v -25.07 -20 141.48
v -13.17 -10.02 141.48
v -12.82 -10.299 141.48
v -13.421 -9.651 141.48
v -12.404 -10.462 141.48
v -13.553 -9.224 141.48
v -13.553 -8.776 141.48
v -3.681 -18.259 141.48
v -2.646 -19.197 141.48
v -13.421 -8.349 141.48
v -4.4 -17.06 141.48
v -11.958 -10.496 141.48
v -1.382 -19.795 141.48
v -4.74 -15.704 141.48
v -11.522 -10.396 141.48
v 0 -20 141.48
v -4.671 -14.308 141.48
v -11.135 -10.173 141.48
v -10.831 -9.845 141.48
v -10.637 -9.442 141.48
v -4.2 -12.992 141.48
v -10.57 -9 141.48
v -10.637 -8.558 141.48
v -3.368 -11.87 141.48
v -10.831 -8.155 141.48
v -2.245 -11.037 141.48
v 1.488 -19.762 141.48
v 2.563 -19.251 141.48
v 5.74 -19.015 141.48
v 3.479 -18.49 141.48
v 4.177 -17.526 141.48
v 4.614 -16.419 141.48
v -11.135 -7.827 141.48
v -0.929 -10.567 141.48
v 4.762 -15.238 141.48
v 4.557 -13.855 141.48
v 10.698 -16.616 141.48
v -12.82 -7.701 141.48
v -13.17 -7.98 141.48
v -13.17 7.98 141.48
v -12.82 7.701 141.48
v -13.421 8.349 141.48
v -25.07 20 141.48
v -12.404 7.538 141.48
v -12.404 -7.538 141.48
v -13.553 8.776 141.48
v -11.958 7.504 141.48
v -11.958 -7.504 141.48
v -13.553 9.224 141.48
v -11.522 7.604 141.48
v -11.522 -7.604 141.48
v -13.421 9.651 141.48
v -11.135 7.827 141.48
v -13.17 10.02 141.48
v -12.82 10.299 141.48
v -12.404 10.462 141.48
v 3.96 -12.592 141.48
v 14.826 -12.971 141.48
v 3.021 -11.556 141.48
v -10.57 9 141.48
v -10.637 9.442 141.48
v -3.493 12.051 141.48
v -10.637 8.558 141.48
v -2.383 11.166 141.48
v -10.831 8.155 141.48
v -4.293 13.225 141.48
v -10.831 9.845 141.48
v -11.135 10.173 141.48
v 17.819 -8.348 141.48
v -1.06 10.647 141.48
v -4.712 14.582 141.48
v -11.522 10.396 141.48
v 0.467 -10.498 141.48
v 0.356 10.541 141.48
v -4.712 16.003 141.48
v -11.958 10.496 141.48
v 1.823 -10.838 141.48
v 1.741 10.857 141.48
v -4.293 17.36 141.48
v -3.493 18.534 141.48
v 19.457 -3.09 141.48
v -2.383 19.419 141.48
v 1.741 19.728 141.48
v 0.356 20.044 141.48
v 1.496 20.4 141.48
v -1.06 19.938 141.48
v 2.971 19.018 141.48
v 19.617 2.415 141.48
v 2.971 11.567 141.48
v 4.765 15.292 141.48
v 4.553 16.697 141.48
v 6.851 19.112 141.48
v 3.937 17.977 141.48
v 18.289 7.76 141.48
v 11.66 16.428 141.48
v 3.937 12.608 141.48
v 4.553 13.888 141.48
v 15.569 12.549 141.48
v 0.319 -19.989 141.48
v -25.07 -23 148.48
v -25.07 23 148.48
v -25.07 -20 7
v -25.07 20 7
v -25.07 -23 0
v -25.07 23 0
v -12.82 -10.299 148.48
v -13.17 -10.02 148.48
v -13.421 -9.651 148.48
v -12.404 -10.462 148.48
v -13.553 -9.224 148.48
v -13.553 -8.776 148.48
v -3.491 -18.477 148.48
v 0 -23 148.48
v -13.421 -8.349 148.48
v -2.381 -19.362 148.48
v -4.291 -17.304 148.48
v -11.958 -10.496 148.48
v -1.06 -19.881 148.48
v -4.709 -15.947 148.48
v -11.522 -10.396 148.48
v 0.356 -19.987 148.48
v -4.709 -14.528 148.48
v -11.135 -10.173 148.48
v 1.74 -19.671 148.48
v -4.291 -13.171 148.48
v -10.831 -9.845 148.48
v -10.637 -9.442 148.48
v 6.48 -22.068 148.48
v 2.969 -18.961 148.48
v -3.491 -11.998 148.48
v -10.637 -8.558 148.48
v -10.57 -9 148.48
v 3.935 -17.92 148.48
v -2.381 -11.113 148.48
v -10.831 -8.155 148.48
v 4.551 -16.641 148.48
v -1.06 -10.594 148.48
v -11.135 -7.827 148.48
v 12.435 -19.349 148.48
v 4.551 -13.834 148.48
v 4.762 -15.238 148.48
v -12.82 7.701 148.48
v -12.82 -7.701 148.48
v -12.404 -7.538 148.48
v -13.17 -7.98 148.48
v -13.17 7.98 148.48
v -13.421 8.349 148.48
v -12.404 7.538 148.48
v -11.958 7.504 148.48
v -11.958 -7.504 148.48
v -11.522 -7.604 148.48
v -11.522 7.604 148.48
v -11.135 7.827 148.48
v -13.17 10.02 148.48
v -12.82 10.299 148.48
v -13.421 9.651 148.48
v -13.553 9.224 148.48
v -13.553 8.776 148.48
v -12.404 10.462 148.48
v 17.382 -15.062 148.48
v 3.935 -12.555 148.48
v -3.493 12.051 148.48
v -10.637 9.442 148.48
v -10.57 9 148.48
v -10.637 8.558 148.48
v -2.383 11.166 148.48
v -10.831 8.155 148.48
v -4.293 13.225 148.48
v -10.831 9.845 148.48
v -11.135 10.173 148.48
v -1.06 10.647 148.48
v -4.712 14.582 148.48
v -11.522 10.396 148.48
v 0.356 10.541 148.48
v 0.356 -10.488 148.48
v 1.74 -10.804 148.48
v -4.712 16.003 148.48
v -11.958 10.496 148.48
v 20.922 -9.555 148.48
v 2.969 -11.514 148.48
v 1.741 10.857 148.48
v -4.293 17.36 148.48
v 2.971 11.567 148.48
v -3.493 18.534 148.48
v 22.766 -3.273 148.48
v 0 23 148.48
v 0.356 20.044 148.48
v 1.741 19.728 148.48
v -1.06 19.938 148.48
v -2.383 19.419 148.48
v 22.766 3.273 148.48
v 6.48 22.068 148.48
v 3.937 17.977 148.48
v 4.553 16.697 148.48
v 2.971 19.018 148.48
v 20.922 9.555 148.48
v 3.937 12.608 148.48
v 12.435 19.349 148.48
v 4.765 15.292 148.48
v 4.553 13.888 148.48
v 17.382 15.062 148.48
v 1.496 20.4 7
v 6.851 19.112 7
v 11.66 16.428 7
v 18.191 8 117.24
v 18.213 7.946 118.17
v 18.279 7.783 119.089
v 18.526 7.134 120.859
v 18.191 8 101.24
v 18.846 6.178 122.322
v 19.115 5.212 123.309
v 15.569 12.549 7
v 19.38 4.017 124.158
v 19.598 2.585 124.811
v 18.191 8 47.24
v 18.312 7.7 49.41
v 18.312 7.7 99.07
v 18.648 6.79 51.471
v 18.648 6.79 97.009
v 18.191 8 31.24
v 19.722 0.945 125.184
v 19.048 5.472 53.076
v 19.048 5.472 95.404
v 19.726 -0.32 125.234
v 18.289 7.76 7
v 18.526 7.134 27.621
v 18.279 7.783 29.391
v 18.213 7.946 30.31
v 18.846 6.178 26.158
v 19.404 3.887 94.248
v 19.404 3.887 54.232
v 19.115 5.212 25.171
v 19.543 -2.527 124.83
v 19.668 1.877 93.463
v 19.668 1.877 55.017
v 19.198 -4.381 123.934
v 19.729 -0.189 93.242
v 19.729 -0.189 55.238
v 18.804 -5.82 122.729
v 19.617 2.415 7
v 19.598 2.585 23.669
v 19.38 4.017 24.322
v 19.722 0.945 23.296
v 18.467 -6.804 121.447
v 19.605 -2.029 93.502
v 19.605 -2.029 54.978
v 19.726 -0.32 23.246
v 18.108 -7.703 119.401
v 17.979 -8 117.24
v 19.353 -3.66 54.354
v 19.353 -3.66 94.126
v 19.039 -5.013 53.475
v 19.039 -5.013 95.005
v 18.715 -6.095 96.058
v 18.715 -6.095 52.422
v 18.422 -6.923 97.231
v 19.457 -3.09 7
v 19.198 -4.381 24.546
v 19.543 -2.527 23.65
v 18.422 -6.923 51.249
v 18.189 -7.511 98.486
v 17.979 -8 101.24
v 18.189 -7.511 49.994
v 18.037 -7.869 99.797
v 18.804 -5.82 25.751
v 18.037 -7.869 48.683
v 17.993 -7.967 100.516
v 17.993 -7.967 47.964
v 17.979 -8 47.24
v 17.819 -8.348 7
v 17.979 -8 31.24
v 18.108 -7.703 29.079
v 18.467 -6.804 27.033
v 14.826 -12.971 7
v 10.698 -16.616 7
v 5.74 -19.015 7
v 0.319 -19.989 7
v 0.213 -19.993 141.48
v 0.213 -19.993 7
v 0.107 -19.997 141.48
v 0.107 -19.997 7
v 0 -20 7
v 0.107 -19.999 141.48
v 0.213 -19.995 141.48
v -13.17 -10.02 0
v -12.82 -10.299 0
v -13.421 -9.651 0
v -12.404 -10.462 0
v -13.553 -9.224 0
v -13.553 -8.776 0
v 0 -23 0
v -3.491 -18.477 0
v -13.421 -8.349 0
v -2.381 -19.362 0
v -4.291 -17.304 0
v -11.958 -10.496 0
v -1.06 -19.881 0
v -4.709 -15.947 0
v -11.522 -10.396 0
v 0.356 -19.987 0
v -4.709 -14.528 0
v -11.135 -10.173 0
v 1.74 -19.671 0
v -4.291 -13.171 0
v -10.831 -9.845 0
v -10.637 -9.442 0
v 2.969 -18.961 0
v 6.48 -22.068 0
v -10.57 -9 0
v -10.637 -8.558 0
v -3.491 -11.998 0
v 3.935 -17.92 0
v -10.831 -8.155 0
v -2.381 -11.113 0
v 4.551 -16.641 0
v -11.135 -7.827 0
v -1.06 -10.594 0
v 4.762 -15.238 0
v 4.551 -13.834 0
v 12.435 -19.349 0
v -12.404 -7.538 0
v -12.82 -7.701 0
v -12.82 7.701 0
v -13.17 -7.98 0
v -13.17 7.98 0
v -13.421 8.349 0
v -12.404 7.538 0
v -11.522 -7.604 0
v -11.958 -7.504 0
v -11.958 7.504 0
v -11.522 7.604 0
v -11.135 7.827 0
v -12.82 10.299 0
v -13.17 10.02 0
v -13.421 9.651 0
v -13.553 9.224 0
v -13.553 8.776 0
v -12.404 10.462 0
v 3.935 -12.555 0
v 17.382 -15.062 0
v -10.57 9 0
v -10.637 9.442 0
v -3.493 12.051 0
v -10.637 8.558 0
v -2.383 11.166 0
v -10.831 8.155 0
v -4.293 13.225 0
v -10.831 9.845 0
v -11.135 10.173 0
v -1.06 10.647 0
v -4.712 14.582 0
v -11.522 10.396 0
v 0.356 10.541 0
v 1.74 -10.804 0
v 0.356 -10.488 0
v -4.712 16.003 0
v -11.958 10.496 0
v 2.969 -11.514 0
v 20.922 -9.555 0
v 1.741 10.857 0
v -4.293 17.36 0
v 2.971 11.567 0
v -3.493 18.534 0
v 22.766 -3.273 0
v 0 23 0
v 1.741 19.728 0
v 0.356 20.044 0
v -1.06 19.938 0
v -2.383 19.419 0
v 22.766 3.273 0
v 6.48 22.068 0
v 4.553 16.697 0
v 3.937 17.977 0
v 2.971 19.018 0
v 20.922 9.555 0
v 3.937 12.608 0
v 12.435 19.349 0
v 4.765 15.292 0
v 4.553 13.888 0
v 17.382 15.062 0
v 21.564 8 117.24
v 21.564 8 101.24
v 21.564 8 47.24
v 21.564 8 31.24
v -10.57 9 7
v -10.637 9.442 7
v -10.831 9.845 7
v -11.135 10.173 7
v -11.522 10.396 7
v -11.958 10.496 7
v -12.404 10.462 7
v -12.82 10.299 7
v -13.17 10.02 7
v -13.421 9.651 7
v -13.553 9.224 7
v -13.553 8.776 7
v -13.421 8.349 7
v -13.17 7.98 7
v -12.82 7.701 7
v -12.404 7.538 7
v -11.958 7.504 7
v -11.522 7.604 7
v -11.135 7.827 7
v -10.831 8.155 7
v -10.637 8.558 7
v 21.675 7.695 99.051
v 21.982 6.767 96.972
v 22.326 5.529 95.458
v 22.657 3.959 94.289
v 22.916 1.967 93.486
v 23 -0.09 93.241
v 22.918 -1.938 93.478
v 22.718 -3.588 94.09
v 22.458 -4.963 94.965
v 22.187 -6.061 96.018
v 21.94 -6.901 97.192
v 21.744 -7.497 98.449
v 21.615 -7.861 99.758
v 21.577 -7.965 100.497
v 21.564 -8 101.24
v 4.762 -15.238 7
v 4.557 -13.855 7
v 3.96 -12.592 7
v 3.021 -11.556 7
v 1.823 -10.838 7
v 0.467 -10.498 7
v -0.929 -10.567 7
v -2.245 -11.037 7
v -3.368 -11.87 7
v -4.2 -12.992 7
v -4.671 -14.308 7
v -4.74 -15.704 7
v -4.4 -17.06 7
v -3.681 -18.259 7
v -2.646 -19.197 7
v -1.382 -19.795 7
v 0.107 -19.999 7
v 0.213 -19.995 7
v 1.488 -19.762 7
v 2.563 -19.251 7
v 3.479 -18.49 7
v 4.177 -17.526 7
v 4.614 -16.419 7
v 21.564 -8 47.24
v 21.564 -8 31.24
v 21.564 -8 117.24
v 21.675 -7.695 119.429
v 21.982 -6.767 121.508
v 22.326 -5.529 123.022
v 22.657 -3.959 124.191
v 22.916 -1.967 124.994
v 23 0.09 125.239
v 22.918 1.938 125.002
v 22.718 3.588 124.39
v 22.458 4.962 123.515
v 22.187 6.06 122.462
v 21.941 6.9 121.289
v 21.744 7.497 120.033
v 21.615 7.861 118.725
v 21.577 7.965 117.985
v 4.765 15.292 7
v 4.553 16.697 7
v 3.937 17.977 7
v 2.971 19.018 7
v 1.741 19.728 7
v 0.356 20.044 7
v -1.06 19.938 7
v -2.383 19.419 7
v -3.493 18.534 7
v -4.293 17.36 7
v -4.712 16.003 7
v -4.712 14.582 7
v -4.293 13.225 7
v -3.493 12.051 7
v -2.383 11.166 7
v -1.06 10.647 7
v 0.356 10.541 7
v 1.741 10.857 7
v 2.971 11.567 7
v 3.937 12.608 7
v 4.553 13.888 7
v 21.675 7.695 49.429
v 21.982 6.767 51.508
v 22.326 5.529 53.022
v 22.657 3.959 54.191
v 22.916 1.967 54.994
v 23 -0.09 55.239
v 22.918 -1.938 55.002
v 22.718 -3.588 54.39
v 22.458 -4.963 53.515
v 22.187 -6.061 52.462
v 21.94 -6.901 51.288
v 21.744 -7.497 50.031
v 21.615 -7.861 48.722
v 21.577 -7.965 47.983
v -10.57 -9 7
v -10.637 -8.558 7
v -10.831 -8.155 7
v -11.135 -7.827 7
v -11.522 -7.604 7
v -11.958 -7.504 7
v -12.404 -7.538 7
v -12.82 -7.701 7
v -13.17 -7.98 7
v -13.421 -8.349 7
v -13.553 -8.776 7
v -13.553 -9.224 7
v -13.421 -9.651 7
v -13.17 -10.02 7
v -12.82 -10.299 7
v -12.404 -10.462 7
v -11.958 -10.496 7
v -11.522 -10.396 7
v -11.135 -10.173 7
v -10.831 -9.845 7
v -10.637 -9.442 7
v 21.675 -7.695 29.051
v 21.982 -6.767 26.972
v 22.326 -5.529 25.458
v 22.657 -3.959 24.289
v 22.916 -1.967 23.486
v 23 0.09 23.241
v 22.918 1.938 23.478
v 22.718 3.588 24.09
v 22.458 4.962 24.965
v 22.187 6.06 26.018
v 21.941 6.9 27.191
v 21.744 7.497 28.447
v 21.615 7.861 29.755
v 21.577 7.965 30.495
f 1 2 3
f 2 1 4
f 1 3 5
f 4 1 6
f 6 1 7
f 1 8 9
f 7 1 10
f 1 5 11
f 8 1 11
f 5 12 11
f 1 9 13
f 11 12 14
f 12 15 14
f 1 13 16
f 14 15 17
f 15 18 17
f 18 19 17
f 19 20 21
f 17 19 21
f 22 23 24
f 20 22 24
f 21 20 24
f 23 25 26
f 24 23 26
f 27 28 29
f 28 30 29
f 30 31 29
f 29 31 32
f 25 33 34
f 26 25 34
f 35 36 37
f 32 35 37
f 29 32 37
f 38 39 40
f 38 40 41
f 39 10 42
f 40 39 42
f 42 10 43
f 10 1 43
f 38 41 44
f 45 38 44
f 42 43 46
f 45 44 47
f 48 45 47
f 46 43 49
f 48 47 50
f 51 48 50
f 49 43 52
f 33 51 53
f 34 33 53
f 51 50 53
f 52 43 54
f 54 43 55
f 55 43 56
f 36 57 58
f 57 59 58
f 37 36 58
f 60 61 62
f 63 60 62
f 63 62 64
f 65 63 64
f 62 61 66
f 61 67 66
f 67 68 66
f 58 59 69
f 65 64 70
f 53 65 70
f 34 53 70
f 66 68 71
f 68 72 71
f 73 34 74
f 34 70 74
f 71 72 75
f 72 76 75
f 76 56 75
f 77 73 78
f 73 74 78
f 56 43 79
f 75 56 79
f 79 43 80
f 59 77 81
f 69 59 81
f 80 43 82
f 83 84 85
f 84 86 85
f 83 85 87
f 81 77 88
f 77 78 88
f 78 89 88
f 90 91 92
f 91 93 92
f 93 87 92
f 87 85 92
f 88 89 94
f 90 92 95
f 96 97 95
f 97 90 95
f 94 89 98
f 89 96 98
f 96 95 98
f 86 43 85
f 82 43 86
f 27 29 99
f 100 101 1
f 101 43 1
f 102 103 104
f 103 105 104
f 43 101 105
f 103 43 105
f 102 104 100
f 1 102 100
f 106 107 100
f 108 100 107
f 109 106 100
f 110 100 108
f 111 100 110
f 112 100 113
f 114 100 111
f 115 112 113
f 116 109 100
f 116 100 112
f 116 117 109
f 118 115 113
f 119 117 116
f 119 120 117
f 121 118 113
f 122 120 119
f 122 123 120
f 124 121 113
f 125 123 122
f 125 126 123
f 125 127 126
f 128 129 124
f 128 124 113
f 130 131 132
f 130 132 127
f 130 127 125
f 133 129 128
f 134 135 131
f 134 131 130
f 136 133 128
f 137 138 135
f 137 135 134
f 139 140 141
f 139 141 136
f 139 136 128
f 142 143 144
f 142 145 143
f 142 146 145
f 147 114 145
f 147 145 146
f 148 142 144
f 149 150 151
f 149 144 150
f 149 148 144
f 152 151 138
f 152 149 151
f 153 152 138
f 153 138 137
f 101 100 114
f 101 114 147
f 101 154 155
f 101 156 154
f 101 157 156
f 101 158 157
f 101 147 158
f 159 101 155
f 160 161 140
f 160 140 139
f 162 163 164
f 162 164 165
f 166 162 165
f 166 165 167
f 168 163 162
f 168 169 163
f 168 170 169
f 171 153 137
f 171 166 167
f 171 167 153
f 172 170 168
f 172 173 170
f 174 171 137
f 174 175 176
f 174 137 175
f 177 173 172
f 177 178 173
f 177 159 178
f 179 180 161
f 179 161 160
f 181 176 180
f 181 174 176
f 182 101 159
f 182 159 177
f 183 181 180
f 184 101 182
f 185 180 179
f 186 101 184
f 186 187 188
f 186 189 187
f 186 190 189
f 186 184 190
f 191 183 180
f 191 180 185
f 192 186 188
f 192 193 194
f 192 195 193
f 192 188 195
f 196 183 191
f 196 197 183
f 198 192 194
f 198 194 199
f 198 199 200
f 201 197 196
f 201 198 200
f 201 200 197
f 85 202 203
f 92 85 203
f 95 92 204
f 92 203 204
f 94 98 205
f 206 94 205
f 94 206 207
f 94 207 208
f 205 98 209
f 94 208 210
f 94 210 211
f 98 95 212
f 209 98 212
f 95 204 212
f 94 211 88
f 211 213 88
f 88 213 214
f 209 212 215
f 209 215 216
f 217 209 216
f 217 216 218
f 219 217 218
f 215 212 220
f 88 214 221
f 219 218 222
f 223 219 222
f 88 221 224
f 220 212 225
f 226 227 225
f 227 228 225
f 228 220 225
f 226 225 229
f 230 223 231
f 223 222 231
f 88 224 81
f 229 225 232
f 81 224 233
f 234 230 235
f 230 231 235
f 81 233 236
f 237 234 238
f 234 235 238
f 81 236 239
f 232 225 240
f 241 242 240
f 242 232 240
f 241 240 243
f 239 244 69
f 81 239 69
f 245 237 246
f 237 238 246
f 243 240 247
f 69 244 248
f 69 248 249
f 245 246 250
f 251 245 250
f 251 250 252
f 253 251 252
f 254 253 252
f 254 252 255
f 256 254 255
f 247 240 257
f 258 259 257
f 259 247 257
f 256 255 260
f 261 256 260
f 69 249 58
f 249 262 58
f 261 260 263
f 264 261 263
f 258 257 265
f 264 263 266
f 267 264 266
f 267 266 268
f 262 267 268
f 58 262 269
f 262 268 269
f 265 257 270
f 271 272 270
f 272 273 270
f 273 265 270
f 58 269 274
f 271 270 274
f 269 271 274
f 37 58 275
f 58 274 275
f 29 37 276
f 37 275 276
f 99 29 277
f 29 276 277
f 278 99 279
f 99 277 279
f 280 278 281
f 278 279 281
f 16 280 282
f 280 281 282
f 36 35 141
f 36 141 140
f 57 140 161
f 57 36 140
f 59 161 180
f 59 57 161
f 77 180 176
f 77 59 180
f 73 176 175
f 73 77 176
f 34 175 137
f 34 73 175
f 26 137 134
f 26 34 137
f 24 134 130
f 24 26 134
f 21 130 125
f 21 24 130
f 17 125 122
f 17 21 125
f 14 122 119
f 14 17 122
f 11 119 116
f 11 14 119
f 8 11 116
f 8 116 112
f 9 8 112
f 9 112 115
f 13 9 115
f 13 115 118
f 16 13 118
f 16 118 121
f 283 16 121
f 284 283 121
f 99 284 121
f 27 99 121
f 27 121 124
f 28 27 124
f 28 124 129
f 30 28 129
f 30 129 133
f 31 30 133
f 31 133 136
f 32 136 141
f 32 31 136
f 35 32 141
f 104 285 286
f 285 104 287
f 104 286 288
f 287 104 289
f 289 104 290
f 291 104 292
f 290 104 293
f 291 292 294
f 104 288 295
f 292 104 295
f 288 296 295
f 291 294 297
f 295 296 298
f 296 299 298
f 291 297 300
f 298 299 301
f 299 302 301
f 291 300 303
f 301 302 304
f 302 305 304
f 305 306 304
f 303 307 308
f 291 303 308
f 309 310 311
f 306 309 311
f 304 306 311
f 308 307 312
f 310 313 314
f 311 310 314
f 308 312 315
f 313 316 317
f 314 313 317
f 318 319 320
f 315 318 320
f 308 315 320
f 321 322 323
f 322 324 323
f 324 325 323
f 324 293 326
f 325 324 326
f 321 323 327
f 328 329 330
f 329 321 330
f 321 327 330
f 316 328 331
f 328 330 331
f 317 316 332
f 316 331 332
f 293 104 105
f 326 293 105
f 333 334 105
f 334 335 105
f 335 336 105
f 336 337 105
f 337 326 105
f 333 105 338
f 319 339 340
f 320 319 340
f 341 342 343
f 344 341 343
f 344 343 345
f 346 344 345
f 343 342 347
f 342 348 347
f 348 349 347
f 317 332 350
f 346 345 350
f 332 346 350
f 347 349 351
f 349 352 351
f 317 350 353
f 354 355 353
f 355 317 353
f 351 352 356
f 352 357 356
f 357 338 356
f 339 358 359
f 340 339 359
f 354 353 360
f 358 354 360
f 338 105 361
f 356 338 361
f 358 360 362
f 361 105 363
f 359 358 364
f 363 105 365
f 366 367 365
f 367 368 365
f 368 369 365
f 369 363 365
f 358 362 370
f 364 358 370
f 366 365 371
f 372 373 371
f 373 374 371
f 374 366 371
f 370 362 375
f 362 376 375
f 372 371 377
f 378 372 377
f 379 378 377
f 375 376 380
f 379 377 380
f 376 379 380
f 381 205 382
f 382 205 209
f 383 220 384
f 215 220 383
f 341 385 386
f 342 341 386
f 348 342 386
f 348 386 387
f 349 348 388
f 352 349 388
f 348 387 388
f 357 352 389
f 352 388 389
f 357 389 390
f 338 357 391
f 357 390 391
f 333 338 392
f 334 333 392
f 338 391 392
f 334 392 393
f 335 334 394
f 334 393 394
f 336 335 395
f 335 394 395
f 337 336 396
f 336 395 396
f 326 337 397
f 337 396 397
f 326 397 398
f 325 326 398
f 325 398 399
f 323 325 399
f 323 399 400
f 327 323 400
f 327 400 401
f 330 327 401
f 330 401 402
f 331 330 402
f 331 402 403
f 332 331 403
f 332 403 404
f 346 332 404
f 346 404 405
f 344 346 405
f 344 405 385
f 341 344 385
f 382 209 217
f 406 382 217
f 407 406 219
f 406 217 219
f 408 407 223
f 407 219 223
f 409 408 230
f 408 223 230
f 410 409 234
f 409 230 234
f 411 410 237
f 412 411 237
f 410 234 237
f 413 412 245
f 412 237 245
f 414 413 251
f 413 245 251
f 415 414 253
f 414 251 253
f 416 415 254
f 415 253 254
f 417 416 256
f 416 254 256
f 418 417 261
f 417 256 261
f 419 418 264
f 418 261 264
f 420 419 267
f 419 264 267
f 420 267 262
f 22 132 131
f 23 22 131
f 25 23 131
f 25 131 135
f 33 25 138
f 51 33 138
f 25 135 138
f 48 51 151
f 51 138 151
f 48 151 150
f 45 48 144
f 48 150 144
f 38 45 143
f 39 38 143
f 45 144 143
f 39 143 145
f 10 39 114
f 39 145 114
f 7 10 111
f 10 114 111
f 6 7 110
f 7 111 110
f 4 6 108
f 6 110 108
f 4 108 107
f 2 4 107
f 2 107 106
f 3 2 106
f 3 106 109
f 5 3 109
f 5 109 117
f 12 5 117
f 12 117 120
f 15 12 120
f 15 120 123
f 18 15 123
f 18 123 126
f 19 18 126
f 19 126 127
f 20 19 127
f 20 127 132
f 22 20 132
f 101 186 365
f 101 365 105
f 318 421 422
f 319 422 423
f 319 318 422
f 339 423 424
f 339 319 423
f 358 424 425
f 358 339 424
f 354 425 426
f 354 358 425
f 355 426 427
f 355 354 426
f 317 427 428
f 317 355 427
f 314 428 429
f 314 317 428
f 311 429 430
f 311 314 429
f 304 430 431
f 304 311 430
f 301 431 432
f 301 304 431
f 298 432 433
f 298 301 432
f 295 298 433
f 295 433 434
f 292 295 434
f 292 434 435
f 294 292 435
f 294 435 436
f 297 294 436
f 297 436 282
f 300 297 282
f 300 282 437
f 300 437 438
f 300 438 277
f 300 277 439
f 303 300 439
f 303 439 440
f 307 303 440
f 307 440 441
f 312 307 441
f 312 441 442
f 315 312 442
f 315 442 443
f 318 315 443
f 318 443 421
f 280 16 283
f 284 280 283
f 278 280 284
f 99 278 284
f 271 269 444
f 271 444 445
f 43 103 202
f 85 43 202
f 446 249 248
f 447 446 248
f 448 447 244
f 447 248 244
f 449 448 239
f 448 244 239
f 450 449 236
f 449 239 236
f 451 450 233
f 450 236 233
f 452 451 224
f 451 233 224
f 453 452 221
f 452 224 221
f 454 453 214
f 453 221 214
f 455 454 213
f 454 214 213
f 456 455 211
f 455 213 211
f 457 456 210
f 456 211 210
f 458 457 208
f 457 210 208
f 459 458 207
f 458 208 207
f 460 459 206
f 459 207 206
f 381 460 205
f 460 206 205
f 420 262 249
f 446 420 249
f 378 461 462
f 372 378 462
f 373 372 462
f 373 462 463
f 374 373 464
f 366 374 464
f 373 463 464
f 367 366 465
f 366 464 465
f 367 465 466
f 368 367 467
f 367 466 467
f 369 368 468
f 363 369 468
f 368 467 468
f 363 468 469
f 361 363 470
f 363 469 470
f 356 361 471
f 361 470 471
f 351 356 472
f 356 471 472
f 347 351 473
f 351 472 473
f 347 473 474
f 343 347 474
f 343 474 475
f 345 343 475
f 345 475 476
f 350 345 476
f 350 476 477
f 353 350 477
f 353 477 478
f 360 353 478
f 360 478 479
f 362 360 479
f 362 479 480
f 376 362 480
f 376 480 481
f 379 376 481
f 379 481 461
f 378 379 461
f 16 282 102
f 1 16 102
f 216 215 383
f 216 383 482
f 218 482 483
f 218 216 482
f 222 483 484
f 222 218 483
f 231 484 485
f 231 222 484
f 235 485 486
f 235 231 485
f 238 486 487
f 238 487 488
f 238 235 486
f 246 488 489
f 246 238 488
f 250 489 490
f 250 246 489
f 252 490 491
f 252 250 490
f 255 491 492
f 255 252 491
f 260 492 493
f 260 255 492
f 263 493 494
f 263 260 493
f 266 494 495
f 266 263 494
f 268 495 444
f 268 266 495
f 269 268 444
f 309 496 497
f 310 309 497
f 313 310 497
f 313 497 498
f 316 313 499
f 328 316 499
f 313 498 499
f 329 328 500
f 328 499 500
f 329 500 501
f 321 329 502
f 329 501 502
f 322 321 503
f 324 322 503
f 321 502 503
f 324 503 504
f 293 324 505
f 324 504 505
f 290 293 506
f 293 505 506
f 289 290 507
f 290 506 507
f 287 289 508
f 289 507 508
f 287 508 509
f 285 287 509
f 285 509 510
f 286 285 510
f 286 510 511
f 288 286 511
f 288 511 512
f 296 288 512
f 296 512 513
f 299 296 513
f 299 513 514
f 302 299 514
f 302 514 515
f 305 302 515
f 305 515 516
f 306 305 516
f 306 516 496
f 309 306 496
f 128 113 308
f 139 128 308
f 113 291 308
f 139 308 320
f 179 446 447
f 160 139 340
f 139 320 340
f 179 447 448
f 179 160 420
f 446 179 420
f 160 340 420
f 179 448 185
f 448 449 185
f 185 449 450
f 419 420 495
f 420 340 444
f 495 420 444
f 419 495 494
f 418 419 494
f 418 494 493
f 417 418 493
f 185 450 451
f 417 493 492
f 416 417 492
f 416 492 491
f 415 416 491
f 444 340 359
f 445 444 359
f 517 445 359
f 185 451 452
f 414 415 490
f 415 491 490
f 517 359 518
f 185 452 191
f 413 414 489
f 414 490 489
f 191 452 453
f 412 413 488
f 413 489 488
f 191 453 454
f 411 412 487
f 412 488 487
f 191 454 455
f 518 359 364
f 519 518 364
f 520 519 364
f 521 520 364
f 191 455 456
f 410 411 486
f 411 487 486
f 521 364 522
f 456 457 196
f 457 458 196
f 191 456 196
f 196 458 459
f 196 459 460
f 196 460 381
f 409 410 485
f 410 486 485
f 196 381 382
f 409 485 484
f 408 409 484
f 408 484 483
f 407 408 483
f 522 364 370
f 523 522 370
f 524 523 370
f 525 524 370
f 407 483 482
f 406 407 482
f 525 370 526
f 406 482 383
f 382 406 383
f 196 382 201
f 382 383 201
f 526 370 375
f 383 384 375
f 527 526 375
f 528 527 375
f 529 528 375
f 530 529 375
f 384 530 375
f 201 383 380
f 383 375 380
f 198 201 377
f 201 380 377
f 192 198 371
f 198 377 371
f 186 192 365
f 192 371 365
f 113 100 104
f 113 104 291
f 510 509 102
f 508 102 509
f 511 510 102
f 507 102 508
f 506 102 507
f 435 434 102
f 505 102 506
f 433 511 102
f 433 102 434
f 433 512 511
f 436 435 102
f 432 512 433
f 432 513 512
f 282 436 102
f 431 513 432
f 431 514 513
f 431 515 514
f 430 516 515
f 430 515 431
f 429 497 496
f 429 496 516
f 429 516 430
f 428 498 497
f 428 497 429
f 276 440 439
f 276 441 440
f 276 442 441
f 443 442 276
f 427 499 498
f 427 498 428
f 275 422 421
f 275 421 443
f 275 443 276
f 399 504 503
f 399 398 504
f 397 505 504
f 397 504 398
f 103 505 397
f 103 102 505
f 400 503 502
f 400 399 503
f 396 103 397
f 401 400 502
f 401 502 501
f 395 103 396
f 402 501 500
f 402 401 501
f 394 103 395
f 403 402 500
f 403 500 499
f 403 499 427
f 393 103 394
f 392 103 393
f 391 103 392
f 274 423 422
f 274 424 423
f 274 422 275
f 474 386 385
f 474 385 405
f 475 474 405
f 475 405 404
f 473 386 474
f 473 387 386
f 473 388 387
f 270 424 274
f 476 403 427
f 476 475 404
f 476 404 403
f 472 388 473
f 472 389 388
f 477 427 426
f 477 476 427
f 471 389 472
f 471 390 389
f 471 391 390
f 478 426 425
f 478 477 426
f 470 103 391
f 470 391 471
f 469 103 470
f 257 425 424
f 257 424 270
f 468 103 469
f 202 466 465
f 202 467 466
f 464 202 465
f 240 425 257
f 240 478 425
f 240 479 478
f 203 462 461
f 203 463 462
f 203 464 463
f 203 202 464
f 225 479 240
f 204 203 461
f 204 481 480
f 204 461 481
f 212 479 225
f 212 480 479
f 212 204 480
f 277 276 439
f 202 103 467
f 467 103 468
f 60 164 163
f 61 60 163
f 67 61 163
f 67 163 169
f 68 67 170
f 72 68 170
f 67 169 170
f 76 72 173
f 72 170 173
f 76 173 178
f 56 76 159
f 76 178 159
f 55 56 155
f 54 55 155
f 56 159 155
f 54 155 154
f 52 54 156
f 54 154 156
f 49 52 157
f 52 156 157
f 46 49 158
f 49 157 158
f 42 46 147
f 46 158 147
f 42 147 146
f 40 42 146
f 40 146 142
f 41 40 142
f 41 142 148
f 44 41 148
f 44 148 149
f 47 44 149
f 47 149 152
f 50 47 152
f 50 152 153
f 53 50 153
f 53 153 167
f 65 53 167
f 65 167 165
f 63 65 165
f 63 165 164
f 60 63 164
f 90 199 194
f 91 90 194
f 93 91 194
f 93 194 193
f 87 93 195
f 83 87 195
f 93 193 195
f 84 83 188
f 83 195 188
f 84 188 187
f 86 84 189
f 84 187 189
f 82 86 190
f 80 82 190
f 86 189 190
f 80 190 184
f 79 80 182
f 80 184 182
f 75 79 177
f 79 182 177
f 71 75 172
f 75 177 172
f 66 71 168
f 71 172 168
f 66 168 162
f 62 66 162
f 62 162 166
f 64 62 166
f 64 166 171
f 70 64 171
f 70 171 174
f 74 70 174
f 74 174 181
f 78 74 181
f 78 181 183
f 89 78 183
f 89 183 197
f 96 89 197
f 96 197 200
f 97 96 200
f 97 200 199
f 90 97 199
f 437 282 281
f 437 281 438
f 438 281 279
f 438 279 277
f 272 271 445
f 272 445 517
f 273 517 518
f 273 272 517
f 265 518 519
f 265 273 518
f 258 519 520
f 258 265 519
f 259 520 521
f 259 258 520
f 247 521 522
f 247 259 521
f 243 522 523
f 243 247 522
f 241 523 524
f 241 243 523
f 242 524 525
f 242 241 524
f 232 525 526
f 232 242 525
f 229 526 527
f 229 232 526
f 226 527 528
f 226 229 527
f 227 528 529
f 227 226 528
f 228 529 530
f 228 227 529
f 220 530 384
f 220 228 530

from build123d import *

# Parameters (mm, degrees)
CROQUIS1_R              = 4.7625
SALIENTE_EXTRUIR3_DEPTH = 7
SALIENTE_EXTRUIR4_DEPTH = 134.48
CROQUIS4_R              = 4.7625
SALIENTE_EXTRUIR5_DEPTH = 7
CORTAR_EXTRUIR1_DEPTH   = 158.75308333
CROQUIS6_R              = 4.765
CORTAR_EXTRUIR2_DEPTH   = 190
CROQUIS8_R              = 1.5
CORTAR_EXTRUIR3_DEPTH   = 154


with BuildPart() as part:
    # Croquis1 → Saliente-Extruir3 (new body)
    with BuildSketch(Plane.XY):
        with BuildLine():
            Line((-25.07, -23), (0, -23))
            ThreePointArc((0, -23), (23, 0), (0, 23))
            Line((0, 23), (-25.07, 23))
            Line((-25.07, 23), (-25.07, -23))
        make_face()
        with Locations((0, -15.2375)):
            Circle(CROQUIS1_R, mode=Mode.SUBTRACT)
    extrude(amount=SALIENTE_EXTRUIR3_DEPTH)

    # Croquis3 → Saliente-Extruir4 (add)
    with BuildSketch(Plane.XY.offset(7)):
        with BuildLine():
            Line((0, 23), (-25.07, 23))
            Line((-25.07, 23), (-25.07, 20))
            Line((-25.07, 20), (1.496213225, 20.399741169))
            ThreePointArc((1.496213225, 20.399741169), (19.71970984, -0.502746878), (0, -20))
            Line((0, -20), (-25.07, -20))
            Line((-25.07, -20), (-25.07, -23))
            Line((-25.07, -23), (0, -23))
            ThreePointArc((0, -23), (23, 0), (0, 23))
        make_face()
    extrude(amount=SALIENTE_EXTRUIR4_DEPTH)

    # Croquis4 → Saliente-Extruir5 (add)
    with BuildSketch(Plane.XY.offset(141.48)):
        with BuildLine():
            Line((-25.07, 23), (-25.07, -23))
            Line((-25.07, -23), (0, -23))
            ThreePointArc((0, -23), (23, 0), (0, 23))
            Line((0, 23), (-25.07, 23))
        make_face()
        with Locations((0, -15.2375)):
            Circle(CROQUIS4_R, mode=Mode.SUBTRACT)
    extrude(amount=SALIENTE_EXTRUIR5_DEPTH)

    # Croquis5 → Cortar-Extruir1 (cut, through all)
    with BuildSketch(Plane.ZY.offset(25.07)):
        with BuildLine():
            Line((31.24, 8), (47.24, 8))
            ThreePointArc((47.24, 8), (55.24, 0), (47.24, -8))
            Line((47.24, -8), (31.24, -8))
            ThreePointArc((31.24, -8), (23.24, 0), (31.24, 8))
        make_face()
        with BuildLine():
            Line((117.24, 8), (101.24, 8))
            ThreePointArc((101.24, 8), (93.24, 0), (101.24, -8))
            Line((101.24, -8), (117.24, -8))
            ThreePointArc((117.24, -8), (125.24, 0), (117.24, 8))
        make_face()
    extrude(amount=-CORTAR_EXTRUIR1_DEPTH, mode=Mode.SUBTRACT)

    # Croquis6 → Cortar-Extruir2 (cut)
    with BuildSketch(Plane.XY.offset(148.48)):
        with Locations((0, 15.2925)):
            Circle(CROQUIS6_R)
    extrude(amount=-CORTAR_EXTRUIR2_DEPTH, mode=Mode.SUBTRACT)

    # Croquis8 → Cortar-Extruir3 (cut)
    with BuildSketch(Plane.XY.offset(148.48)):
        with Locations((-12.07, 9)):
            Circle(CROQUIS8_R)
        with Locations((-12.07, -9)):
            Circle(CROQUIS8_R)
    extrude(amount=-CORTAR_EXTRUIR3_DEPTH, mode=Mode.SUBTRACT)


solid = part.part
